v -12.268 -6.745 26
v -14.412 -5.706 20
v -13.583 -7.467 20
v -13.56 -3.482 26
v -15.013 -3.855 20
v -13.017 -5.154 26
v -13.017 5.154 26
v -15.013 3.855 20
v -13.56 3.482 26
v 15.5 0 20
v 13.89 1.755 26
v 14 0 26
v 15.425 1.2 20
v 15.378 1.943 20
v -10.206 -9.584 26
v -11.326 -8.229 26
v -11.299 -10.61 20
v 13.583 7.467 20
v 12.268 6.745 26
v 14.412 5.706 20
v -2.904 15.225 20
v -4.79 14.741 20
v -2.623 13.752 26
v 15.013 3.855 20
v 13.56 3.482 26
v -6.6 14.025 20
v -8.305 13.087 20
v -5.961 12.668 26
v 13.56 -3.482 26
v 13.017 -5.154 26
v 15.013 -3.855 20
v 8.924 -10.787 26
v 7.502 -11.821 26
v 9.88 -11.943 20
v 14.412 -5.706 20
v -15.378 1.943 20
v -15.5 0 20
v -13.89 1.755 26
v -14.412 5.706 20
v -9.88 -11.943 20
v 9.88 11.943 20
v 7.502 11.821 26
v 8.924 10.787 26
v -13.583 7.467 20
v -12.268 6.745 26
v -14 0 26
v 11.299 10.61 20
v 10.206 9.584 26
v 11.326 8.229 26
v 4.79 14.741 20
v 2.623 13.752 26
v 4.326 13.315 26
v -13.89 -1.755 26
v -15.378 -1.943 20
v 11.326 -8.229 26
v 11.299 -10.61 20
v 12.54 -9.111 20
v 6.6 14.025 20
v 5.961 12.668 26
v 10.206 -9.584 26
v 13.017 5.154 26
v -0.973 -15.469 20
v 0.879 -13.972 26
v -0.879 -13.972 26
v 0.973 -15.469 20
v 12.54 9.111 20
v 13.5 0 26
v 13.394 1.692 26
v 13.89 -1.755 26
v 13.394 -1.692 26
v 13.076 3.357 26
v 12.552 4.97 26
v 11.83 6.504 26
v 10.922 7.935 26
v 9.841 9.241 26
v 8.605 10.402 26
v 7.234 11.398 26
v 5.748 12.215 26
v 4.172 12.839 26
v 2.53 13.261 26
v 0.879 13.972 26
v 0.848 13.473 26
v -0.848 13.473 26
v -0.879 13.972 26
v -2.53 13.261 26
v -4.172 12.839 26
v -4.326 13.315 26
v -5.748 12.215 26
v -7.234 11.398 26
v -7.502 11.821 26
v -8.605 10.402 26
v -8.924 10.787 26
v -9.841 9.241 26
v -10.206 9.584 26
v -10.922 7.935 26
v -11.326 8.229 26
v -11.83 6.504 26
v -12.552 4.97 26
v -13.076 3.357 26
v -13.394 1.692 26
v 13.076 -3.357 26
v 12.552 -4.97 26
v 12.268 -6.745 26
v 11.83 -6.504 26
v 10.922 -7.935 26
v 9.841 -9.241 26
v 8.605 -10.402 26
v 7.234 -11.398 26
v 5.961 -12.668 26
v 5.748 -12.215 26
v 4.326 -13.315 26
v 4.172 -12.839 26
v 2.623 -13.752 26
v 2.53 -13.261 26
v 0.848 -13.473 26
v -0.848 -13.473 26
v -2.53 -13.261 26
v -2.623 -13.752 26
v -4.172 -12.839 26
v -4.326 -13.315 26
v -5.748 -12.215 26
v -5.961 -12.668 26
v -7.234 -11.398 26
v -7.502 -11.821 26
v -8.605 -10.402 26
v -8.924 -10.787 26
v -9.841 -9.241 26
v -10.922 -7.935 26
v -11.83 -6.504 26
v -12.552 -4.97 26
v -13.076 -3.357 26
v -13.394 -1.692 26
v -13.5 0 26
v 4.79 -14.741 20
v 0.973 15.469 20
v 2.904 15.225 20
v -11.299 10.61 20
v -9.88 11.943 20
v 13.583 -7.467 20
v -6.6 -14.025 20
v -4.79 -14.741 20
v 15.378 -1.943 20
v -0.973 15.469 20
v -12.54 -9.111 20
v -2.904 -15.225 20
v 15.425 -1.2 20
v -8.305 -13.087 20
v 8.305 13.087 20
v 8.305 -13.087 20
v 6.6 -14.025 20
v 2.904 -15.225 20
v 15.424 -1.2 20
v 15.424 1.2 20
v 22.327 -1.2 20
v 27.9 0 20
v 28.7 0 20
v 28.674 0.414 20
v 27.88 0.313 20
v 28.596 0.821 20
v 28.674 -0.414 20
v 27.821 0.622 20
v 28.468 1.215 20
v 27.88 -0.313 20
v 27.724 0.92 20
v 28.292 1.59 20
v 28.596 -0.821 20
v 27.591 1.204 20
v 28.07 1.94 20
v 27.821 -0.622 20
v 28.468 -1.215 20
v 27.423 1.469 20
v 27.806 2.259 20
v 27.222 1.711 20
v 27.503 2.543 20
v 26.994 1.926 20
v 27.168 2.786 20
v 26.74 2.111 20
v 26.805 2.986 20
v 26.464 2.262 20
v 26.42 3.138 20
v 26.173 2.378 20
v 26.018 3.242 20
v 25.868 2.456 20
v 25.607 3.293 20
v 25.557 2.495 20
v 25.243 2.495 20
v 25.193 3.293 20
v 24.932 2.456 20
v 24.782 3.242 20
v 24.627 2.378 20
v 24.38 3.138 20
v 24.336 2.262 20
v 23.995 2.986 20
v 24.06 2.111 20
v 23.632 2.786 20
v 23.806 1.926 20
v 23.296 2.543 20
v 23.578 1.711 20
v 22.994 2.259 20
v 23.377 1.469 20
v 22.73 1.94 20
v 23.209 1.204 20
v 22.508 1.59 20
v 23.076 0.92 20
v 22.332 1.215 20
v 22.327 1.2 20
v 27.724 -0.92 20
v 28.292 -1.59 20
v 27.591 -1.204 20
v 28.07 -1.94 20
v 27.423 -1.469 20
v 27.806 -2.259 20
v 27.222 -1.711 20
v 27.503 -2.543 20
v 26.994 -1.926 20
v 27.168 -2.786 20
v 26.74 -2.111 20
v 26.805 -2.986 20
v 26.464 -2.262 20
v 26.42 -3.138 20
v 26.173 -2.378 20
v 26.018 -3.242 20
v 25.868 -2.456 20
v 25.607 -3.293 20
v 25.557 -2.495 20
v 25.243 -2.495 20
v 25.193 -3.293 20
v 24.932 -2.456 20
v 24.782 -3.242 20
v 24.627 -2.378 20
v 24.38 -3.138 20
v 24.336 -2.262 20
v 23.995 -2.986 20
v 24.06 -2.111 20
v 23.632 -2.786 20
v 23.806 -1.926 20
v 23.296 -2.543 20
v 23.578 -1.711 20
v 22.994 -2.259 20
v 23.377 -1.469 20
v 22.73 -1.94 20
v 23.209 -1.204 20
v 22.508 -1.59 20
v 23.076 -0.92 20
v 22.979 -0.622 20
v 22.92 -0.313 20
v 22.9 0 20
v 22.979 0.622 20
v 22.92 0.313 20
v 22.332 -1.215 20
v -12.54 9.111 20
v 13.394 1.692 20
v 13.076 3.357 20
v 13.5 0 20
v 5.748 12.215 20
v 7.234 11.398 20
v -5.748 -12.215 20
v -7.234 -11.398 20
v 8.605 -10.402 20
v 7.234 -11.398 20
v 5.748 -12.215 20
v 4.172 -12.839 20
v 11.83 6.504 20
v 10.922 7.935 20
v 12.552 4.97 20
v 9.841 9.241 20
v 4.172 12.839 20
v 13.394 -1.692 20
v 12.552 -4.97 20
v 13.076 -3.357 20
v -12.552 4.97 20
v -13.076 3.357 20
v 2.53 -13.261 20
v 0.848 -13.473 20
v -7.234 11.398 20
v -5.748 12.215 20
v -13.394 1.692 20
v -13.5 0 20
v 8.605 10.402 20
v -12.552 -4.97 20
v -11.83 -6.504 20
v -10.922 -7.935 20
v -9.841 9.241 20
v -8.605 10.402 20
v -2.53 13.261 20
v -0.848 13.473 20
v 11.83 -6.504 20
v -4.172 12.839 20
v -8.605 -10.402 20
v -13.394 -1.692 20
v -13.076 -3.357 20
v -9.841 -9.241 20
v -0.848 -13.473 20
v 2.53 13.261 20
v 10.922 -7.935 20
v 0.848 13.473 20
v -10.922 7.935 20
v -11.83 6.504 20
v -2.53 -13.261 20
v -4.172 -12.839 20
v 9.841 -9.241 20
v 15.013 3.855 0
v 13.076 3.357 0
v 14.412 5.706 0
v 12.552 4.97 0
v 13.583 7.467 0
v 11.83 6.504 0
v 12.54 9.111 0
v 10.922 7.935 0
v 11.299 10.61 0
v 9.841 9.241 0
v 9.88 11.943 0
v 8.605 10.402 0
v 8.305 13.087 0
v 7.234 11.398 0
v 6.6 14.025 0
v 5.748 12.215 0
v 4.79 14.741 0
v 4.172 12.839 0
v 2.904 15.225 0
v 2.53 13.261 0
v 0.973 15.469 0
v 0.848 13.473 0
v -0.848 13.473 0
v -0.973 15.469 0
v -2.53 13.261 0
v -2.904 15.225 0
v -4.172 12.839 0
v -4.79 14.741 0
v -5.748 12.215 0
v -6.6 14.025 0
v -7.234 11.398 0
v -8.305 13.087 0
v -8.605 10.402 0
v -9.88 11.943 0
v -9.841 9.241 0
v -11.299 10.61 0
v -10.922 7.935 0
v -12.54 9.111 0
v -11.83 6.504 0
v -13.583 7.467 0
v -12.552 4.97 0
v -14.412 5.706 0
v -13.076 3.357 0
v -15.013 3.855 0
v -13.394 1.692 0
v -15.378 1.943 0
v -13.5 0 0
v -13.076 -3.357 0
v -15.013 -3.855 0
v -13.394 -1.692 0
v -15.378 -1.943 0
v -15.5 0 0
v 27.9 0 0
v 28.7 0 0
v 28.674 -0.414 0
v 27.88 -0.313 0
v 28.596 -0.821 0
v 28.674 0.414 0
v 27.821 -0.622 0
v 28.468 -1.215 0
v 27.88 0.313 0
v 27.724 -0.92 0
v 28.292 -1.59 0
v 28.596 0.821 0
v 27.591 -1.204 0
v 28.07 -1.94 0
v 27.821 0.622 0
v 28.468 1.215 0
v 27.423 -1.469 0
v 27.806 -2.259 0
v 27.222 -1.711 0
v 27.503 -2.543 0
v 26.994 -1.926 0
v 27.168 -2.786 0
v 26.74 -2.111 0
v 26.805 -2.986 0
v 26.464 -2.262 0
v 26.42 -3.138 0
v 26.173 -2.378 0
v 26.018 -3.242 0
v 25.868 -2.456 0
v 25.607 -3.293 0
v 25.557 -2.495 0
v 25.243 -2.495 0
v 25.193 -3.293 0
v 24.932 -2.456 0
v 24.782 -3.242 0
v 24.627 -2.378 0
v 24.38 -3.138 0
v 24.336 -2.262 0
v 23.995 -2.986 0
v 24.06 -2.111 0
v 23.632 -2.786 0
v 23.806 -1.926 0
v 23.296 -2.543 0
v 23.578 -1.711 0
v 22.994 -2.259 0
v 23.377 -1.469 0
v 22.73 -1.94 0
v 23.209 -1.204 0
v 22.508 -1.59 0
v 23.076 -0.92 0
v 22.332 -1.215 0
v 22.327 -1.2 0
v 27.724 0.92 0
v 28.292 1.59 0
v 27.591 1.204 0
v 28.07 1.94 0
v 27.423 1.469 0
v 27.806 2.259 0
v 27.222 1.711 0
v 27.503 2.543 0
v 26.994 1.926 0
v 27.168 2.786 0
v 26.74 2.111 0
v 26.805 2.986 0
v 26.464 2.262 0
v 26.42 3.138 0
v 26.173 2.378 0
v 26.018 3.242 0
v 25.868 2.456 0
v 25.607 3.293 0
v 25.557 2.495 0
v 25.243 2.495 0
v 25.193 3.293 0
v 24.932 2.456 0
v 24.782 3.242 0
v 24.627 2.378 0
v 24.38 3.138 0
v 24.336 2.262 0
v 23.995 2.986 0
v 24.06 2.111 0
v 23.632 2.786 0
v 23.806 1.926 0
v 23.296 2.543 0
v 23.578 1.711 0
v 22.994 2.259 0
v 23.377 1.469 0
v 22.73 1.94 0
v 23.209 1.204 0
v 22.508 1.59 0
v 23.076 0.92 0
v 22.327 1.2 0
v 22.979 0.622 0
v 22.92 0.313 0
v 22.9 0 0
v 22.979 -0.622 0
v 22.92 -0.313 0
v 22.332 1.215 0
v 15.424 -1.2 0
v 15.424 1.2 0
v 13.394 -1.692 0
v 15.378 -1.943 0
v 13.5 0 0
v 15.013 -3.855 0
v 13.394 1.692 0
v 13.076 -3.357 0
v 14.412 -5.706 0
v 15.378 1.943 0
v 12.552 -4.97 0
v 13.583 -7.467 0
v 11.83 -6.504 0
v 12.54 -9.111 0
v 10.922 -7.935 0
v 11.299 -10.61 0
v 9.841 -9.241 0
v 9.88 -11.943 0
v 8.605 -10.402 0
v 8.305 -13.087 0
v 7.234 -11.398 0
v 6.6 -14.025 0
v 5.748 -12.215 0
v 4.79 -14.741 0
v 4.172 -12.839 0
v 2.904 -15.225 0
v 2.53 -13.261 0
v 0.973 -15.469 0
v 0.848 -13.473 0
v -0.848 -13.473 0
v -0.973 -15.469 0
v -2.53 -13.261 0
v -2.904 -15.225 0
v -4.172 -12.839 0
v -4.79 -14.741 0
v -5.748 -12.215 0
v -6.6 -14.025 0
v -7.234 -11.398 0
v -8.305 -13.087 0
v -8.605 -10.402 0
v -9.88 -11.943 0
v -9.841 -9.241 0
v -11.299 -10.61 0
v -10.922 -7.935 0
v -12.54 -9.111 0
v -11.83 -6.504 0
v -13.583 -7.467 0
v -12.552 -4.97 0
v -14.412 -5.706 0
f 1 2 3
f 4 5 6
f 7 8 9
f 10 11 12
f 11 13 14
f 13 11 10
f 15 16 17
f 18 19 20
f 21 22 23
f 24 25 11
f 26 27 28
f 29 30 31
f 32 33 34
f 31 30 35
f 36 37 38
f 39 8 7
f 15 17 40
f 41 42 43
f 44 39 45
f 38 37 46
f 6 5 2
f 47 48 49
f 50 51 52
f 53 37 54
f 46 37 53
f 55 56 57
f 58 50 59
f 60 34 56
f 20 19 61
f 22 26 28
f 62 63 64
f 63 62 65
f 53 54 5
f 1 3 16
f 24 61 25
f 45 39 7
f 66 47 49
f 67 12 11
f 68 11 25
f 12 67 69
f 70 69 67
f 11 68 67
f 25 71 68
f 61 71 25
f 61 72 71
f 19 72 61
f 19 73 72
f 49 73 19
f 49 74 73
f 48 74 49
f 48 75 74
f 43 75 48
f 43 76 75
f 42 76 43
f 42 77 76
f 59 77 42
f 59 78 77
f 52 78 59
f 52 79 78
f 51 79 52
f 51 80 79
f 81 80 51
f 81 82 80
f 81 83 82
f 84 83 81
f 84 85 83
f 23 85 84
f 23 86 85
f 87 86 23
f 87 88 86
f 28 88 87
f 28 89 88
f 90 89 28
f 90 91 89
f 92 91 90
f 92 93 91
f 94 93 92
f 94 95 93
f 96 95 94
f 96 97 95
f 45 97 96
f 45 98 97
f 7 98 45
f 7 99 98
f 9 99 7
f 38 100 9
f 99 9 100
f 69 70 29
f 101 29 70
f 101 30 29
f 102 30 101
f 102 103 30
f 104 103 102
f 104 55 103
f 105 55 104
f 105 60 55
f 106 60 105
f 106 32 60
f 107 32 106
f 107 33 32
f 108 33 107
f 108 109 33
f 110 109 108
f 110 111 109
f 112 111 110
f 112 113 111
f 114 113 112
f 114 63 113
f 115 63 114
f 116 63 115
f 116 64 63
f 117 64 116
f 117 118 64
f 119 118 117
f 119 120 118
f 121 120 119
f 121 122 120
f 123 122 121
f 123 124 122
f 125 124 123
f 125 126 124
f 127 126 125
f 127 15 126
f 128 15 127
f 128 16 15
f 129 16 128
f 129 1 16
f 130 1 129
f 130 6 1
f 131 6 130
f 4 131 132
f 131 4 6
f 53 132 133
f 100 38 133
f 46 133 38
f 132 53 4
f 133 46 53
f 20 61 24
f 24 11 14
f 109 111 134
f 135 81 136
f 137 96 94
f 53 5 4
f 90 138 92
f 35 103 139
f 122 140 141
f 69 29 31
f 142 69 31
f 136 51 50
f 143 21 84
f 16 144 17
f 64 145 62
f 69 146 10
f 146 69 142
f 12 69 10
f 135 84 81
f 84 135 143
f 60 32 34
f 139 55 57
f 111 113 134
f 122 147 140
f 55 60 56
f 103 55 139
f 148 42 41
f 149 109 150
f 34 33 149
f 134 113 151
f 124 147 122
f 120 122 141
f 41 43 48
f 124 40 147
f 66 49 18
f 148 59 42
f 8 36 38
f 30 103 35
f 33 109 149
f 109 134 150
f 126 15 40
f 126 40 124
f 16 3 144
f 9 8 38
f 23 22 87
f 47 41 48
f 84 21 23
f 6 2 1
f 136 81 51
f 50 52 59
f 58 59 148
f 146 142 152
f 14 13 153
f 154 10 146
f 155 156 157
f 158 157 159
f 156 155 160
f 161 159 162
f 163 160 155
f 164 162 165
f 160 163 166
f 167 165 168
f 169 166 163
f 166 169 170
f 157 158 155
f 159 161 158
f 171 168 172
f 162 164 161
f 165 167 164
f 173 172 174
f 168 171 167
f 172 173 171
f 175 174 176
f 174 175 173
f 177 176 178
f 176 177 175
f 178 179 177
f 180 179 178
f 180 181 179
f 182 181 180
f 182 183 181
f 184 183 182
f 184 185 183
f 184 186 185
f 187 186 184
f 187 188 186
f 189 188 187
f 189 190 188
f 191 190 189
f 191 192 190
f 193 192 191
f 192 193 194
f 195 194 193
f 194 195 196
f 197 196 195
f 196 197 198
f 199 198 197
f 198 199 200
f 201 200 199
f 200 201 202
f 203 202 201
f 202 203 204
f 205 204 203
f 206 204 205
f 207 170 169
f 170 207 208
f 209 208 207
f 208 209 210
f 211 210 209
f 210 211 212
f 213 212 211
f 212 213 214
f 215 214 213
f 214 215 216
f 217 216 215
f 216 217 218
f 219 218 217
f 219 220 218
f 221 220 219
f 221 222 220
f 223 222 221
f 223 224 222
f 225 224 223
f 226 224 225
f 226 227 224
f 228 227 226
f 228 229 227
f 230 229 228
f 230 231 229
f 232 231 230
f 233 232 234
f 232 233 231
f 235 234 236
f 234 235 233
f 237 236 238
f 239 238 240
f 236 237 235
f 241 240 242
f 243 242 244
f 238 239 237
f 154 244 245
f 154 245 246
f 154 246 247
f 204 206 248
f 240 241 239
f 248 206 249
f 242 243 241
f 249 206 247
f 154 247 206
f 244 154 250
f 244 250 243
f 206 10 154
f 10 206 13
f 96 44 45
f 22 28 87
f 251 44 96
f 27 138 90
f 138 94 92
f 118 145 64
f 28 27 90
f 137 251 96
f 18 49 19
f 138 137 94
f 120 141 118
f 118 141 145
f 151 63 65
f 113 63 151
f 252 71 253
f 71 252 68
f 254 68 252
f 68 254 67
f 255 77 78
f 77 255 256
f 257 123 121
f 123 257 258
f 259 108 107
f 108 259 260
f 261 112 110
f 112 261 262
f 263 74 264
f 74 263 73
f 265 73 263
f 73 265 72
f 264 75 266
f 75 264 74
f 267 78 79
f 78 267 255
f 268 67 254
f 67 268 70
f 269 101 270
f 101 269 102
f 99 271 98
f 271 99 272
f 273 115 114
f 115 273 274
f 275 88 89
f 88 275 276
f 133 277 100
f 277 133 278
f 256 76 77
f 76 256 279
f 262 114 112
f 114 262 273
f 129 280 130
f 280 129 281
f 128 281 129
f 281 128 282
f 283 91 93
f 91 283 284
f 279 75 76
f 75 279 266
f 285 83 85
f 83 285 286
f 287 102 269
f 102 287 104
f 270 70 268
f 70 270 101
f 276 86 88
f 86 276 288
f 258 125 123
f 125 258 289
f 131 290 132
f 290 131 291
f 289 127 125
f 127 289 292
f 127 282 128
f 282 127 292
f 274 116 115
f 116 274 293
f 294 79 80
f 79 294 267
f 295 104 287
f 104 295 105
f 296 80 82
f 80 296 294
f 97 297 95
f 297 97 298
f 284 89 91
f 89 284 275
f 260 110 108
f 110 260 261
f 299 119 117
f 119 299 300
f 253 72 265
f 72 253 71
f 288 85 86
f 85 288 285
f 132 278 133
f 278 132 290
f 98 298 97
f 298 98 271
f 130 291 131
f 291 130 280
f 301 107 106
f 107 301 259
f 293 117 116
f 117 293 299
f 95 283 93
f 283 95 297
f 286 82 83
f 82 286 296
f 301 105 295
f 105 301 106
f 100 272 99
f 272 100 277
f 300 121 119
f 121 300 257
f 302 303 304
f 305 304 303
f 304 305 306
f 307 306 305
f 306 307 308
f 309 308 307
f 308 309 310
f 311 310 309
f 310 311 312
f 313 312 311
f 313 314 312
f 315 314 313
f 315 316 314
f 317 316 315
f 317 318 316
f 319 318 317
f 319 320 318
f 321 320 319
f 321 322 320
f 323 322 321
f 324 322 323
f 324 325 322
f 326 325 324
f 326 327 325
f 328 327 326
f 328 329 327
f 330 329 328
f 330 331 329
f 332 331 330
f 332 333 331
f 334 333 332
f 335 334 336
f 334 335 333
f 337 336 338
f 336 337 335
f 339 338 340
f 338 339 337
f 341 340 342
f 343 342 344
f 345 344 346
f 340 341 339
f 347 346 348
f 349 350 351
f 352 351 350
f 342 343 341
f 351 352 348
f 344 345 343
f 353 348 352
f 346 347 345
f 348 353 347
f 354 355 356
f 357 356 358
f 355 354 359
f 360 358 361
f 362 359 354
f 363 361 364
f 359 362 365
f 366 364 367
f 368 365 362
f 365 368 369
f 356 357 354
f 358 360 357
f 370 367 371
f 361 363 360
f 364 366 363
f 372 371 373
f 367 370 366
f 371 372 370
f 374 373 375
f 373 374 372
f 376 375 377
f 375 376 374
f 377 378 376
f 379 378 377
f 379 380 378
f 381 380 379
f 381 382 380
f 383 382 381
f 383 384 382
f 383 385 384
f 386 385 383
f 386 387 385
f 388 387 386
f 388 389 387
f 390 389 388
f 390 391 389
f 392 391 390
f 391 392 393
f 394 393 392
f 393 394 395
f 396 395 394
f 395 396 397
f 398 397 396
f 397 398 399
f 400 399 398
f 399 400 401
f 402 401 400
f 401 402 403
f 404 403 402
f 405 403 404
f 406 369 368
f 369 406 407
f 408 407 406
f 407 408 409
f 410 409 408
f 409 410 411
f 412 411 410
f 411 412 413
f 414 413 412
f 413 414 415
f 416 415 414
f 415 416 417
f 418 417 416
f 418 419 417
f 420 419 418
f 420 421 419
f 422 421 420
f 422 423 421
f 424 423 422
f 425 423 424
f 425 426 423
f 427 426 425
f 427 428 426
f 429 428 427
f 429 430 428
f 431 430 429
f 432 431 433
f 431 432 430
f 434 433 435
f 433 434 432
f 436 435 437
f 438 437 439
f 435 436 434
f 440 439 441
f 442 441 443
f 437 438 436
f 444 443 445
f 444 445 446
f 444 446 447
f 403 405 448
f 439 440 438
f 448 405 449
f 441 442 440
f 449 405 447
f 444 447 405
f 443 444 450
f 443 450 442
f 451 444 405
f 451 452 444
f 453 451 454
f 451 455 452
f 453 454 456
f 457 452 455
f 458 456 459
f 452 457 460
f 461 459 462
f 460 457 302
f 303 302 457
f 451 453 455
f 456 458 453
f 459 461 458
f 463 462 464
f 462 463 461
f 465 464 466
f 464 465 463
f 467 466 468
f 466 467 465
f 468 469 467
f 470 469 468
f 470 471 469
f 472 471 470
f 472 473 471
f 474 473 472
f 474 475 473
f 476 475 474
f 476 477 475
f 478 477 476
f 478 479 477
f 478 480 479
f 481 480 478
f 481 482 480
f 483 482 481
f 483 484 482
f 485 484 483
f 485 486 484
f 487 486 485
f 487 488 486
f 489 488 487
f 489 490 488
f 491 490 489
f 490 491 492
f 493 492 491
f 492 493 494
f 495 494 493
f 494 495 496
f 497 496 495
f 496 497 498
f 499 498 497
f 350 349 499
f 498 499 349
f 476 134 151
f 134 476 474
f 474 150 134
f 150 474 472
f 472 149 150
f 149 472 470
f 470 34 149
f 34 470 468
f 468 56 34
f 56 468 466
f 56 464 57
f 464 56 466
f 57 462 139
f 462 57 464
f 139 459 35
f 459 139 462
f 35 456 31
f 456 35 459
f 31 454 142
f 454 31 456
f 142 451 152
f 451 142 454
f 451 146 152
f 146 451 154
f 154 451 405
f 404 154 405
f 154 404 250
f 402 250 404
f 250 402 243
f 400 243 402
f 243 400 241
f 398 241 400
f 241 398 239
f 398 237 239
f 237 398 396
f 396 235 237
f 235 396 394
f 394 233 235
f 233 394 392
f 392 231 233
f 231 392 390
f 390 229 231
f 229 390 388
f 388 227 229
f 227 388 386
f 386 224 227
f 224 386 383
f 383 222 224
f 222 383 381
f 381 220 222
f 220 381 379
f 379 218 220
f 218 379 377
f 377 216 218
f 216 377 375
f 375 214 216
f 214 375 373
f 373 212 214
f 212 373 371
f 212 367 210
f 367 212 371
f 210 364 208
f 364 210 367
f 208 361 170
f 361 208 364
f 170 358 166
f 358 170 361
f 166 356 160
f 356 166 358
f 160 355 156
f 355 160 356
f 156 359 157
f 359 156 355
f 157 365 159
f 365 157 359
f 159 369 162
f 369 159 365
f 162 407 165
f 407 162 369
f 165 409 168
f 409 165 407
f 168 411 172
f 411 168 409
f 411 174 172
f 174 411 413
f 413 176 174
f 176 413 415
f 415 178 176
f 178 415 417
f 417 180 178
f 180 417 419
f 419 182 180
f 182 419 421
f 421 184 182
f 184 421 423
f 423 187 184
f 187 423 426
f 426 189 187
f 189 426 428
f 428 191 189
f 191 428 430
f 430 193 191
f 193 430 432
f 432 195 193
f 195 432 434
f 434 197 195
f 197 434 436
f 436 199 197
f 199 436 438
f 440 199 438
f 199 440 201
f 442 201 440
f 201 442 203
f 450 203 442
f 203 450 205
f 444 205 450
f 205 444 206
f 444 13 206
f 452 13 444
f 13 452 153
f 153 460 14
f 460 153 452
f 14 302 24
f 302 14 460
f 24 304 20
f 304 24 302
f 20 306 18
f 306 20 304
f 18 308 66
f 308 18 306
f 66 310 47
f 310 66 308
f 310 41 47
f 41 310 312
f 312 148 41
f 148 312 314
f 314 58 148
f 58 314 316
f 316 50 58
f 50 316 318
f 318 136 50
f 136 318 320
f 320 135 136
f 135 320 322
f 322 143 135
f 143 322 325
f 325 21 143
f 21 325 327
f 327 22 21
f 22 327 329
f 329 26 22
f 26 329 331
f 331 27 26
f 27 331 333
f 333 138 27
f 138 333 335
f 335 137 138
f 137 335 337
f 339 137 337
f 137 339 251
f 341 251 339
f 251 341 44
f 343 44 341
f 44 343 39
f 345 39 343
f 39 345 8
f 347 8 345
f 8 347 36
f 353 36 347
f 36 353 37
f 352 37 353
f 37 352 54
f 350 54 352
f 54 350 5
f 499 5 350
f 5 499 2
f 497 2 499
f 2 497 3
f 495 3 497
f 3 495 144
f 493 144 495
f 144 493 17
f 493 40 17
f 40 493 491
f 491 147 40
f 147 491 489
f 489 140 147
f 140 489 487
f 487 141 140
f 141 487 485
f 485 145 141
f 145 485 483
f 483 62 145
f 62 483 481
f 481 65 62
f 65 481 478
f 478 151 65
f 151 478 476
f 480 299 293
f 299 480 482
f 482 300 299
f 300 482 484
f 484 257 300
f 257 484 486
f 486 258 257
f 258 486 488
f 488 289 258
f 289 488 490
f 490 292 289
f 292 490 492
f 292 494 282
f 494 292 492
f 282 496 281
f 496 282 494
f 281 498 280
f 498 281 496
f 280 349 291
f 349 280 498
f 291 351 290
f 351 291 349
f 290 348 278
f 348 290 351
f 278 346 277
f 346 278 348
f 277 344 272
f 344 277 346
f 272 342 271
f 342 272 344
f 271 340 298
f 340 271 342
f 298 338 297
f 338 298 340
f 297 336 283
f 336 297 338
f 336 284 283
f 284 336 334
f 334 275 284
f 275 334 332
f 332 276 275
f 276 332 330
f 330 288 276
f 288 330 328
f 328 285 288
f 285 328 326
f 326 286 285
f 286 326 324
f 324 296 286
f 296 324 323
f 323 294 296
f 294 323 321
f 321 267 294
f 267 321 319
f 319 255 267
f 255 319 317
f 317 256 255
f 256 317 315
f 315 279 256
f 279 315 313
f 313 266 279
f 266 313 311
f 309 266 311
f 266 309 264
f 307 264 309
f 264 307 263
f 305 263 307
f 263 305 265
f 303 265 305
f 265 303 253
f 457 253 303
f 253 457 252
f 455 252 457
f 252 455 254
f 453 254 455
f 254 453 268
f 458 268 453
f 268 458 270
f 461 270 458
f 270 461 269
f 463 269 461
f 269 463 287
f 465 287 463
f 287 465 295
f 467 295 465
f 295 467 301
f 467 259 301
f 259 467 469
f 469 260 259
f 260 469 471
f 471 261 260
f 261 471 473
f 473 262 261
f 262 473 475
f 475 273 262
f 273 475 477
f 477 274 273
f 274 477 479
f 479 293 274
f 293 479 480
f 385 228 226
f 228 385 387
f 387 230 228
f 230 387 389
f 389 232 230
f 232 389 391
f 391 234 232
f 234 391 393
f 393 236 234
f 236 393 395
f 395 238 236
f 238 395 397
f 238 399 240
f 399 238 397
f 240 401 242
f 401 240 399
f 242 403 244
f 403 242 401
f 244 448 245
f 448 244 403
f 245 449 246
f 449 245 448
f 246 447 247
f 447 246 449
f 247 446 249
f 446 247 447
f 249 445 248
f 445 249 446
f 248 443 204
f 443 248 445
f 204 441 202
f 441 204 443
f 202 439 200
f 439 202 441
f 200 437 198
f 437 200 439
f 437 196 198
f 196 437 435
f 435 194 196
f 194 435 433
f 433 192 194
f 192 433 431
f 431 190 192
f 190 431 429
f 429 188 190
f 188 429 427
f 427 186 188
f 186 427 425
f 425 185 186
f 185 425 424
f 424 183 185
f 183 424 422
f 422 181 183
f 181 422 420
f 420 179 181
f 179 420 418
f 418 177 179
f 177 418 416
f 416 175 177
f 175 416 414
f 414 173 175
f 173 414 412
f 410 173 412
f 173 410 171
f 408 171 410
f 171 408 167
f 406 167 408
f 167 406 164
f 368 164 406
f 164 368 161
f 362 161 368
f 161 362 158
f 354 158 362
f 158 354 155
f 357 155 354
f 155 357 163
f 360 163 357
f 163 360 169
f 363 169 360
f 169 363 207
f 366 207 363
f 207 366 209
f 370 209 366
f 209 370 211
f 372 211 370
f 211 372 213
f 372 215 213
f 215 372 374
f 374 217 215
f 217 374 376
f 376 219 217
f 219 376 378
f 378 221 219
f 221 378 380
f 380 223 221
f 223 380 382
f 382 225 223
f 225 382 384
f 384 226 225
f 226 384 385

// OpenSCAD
part="guide";
name="MK III";
guidehod=5;
guidedist=25.4;
body_helper=0;

if(part=="all") {
  rocket_base();
  translate(body_helper?[0,0,4]:[])
  {
  translate([0,0,140]) rocket_body();
  translate([0,0,266]) rocket_nose();
  }
} else if(part=="all2")
{
  translate([-60,30]) rocket_body();
  translate([60,30]) rocket_nose();
  translate([0,0,140]) rotate([180,0,60]) rocket_base();
  if(body_helper)
      translate([0,-60]) rocket_body_helper();
} else if(part=="guide") {
  difference() {
    union() {
      translate([0,0,20]) difference() {
        cylinder(d1=31,d2=28,h=6,$fn=50);
        translate([0,0,-.01]) cylinder(d=27,h=6.02,$fn=50);
      }
      linear_extrude(20,convexity=3) difference() {
        union() {
          circle(d=31,$fn=50);
          translate([guidedist,0]) circle(d=guidehod+1.6,$fn=50);
          translate([0,-1.2]) square([guidedist,2.4]);
        }
        circle(d=27,$fn=50);
        translate([guidedist,0]) circle(d=guidehod,$fn=50);
      }
    }
    *for(r=[30:60:360]) rotate([0,0,r]) translate([0,-1.2,-.1]) cube([guidedist,2.4,10]);
  }
} else if(part=="nose")
  rocket_nose();
else if(part=="body")
  rotate([0,0,270]) rocket_body();
else if(part=="base")
  translate([0,0,140]) rotate([180,0,60]) rocket_base();

module rocket_nose() {
  ring2(od1=42,id1=38,h=20);
  translate([0,0,20])
    ring2(od1=42,od2=30,id1=38,id2=26,h=32);
  translate([0,0,52])
    ring2(od1=30,od2=20.2,id1=26,id2=14,h=16);
  translate([0,0,68])
    ring2(od1=20.2,od2=15.6,id1=14,id2=8,h=6);
  translate([0,0,74])
    ring2(od1=15.6,od2=12.5,id1=8,id2=0,h=3);
  translate([0,0,77])
    cylinder(d1=12.5,d2=10.2,h=2);
  translate([0,0,79])
    cylinder(d1=10.2,d2=7,h=2);
  translate([0,0,81])
    cylinder(d1=7,d2=3.8,h=1.3);
  translate([0,0,82.3])
    cylinder(d1=3.8,d2=0,h=.4);
}
module rocket_base() {
 translate([0,0,50]) difference(){
   union() {
    cylinder(d=42,h=90);
  if(guidehod>0)
  {
    translate([0,0,70]) rotate([0,0,150]) linear_extrude(20,convexity=3) {
      translate([0,-1.2]) square([guidedist-guidehod+1.2,2.4]);
      translate([guidedist,0]) difference() { circle(d=guidehod+2.4,$fn=24); circle(d=guidehod,$fn=20); }
    }
  }
   }
    if(body_helper)
    {
      translate([0,0,81.6]) {
        cylinder(d1=28.4,d2=34,h=8.41,$fn=50);
      }
    }
    translate([0,0,-.01]) cylinder(d=26.4,h=90.02);
    translate([0,0,-.01]) cylinder(d=33.4,h=53.4);
   translate([0,0,79.8]) cylinder(d1=33.4,d1=26.4,h=10.5);
  }
  rotate([0,0,-30]) translate([20.6,0]) rocket_fin_welded(text=name);
  rotate([0,0,90]) translate([20.6,0]) rocket_fin_welded(text=name);
  rotate([0,0,210]) translate([20.6,0]) rocket_fin_welded(text=name);
}
module rocket_fin_welded(w=5,text="") {
   difference() {
     rocket_fin();
    translate([30,-2,60]) rotate([90,0]) linear_extrude(1) text(text,halign="center");
  }
    intersection(){
      translate([-1,0,1.1]) rocket_fin(15);
      translate([2,4.2,50]) intersection(){
        translate([-2,-9]) cube([2,9,90]);
        union(){
          translate([-.2,-8.7]) difference() {
            translate([-2,-2]) cube([4,4,90]);
            translate([0,0,-.01]) cylinder(d=4,h=90.02,$fn=20);
          }
          translate([-.2,.2]) difference() {
            translate([-2,-2]) cube([4,4,90]);
            translate([0,0,-.01]) cylinder(d=4,h=90.02,$fn=20);
          }
        }
      }
    }

}
module rocket_fin(w=5) {
  rotate([90,0])
  translate([0,0,w*-.5])
  linear_extrude(w)
    polygon([[0,50],[0,140],[70,58],[70,0],[40,0],[30,30]]);
}
module rocket_body_helper() {
  difference() {
    union() {
      cylinder(d=42,h=9.1,h=4,$fn=50);
      translate([0,0,4]) cylinder(d1=35.6,d2=24,h=9,$fn=50);
      mirror([0,0,1]) cylinder(d1=32.4,d2=28,h=8,$fn=50);
    }
    translate([0,0,-20.1]) cylinder(d=23.5,h=40,$fn=50);
  }
}
module rocket_body() {
  if(body_helper)
  {
    *%translate([0,0,-4]) rocket_body_helper();
    difference() {
      cylinder(d=42,h=9.1,$fn=50);
      translate([0,0,-.1]) cylinder(d1=36,d2=23.5,h=9.3,$fn=50);
    }
  } else
  difference() {
    cylinder(d=25.6,h=9.1,$fn=50);
    translate([0,0,-.01]) cylinder(d=23.5,h=10.02,$fn=50);
  }
  translate([0,0,9.1])
    difference() {
      union(){
        cylinder(d1=42,d2=42,h=10,$fn=50);
        translate([0,0,10]) cylinder(d=42,h=107.5,$fn=50);
        translate([0,0,117.5]) cylinder(d=36.8,h=17.4,$fn=50);
      }
      *translate([19,-5,65]) rotate([0,90,0])
        linear_extrude(4) text(name,halign="center");
      translate([0,0,-.01]) cylinder(d1=23.5,d2=23.5,h=10.03,$fn=50);
      translate([0,0,10.01]) cylinder(d=31.8,h=140,$fn=50);
    }
}

module ring2(od1,od2=false,id1,id2=false,h,$fn=40)
{
   difference(){
     if(od2)
       cylinder(d1=od1,d2=od2,h=h,$fn=$fn);
     else
       cylinder(d=od1,h=h,$fn=$fn);
     translate([0,0,-.01])
     {
       if(od2)
         cylinder(d1=id1,d2=id2,h=h+.02,$fn=$fn);
       else
         cylinder(d=id1,h=h+.02,$fn=$fn);
     }
   }
}
